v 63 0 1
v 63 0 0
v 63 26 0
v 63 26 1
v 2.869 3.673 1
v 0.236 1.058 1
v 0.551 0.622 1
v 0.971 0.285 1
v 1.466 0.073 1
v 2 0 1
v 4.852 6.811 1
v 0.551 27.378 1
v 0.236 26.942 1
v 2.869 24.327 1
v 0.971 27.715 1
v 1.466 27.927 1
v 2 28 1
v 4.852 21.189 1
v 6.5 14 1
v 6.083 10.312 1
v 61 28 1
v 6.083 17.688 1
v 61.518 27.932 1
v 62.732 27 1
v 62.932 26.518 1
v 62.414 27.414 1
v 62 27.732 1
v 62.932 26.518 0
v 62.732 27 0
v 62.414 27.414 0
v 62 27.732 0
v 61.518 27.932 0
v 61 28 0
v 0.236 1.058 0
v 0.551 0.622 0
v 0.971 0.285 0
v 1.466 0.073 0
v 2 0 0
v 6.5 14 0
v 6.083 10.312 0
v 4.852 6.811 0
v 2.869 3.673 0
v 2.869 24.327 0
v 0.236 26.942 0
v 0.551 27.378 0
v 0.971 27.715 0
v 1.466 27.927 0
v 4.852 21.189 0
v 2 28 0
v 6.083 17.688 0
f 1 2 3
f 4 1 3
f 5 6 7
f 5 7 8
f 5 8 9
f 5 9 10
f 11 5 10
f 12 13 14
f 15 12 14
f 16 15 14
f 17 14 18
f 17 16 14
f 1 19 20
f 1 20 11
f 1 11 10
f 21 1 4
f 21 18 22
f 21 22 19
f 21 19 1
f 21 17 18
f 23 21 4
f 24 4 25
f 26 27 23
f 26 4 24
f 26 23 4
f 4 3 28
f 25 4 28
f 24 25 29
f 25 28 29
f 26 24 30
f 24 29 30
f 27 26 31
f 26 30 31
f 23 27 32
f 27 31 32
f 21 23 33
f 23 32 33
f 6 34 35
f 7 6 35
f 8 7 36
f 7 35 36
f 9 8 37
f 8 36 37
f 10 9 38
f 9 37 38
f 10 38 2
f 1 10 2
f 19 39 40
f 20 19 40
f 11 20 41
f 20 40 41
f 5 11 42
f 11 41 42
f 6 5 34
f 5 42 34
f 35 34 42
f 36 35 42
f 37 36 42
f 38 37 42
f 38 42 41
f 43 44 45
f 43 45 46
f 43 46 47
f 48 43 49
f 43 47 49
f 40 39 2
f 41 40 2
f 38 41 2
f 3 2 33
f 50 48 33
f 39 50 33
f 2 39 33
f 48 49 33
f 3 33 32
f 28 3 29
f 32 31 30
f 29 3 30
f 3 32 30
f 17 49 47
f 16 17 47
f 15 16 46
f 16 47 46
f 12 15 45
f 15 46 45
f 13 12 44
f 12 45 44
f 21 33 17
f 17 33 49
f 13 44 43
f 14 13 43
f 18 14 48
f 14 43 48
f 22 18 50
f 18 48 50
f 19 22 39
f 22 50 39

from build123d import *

# Parameters (mm, degrees)
F1_DEPTH = 1


with BuildPart() as f1:
    # F0 (on Top) → F1 (new body)
    with BuildSketch(Plane.XY):
        with BuildLine():
            ThreePointArc((0.235507, 1.058424), (0.971203, 0.284898), (2, 0))
            Line((2, 0), (63, 0))
            Line((63, 0), (63, 26))
            ThreePointArc((63, 26), (62.414214, 27.414214), (61, 28))
            Line((61, 28), (2, 28))
            ThreePointArc((2, 28), (0.971203, 27.715102), (0.235507, 26.941576))
            ThreePointArc((0.235507, 26.941576), (4.85153, 21.189024), (6.5, 14))
            ThreePointArc((6.5, 14), (4.85153, 6.810976), (0.235507, 1.058424))
        make_face()
    extrude(amount=F1_DEPTH)


solid = f1.part
